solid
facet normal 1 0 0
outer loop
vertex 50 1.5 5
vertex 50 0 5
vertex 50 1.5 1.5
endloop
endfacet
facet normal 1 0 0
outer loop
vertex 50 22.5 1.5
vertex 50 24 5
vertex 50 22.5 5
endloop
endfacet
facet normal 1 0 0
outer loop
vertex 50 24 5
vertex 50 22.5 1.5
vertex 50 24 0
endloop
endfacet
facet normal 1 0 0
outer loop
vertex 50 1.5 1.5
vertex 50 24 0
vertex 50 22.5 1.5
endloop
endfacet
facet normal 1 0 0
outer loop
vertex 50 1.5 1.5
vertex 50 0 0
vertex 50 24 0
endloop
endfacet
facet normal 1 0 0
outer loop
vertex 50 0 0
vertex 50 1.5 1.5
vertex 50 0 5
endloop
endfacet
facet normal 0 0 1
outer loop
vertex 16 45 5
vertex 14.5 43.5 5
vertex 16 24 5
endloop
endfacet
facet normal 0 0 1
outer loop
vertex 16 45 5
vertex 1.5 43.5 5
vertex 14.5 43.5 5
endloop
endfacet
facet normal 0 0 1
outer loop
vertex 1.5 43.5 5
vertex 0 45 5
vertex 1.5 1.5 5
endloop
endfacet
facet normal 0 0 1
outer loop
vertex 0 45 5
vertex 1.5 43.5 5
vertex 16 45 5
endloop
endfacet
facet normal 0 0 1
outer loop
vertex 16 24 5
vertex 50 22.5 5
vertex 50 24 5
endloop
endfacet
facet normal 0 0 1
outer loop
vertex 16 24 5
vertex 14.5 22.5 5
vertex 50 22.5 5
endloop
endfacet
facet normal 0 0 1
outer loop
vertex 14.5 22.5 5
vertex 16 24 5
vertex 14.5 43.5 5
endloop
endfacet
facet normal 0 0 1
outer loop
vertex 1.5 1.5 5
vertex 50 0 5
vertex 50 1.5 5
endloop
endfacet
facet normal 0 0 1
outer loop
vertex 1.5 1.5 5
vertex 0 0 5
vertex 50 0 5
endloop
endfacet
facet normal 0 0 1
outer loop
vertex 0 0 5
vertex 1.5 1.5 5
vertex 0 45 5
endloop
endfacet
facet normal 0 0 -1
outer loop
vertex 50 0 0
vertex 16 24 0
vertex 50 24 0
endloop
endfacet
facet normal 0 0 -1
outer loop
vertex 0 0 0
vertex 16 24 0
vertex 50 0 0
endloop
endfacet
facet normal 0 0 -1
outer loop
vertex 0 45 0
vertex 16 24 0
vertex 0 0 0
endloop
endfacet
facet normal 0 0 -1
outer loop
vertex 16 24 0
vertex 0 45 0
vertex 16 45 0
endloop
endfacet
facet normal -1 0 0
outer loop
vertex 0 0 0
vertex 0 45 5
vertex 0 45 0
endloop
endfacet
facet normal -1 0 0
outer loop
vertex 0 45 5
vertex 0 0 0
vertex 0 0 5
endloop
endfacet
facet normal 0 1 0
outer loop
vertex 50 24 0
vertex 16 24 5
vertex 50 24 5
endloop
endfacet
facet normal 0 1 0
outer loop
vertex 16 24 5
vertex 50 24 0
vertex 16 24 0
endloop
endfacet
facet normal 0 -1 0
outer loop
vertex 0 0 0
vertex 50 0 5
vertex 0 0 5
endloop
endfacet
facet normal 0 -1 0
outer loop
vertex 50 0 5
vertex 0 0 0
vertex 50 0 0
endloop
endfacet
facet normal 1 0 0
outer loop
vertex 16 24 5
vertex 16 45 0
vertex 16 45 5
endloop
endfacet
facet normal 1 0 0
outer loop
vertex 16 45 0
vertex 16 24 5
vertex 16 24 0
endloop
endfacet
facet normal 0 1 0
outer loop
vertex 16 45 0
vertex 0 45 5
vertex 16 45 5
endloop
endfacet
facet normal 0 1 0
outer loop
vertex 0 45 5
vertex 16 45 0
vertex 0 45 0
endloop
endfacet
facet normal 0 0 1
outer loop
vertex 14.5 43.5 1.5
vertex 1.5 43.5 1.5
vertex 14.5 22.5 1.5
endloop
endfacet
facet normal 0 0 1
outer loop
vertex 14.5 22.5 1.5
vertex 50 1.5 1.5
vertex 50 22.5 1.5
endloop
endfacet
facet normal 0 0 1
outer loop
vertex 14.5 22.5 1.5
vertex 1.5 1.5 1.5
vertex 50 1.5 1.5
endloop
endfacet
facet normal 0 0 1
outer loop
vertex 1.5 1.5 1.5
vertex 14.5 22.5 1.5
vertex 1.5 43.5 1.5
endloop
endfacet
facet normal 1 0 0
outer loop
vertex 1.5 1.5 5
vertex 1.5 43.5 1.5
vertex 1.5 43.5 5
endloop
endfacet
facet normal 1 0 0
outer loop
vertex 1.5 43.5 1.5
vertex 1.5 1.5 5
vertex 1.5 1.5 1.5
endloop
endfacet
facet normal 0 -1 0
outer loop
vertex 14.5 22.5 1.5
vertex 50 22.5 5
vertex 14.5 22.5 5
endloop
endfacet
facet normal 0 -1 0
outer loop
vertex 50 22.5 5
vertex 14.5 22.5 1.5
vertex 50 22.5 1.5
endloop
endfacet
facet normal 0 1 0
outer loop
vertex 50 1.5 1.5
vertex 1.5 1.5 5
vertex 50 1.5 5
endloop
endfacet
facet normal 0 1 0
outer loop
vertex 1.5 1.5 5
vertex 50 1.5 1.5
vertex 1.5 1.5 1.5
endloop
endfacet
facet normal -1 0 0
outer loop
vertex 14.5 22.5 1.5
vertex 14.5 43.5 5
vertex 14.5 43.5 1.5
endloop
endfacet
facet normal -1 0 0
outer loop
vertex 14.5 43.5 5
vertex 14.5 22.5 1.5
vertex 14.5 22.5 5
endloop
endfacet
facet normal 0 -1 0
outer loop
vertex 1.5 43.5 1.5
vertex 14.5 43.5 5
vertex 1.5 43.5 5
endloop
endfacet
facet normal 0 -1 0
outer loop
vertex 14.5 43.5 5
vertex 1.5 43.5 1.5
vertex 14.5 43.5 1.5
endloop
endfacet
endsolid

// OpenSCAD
module palanges_kampas() {
    // wall width
    wall=1.5;
    difference() {
        kampas(0);
        translate([wall, wall, wall]) {
            kampas(wall);
        }
    }
}

module kampas(wall=0)
{
    length=50;
    width=24-2*wall;
    height=5;
    
    
    length2=16-2*wall;
    width2=45-2*wall;
    
    union() {
        cube([length, width, height]);
        cube([length2, width2, height]);
    }
}

palanges_kampas();
//difference()  {circle(10);square(10);}
